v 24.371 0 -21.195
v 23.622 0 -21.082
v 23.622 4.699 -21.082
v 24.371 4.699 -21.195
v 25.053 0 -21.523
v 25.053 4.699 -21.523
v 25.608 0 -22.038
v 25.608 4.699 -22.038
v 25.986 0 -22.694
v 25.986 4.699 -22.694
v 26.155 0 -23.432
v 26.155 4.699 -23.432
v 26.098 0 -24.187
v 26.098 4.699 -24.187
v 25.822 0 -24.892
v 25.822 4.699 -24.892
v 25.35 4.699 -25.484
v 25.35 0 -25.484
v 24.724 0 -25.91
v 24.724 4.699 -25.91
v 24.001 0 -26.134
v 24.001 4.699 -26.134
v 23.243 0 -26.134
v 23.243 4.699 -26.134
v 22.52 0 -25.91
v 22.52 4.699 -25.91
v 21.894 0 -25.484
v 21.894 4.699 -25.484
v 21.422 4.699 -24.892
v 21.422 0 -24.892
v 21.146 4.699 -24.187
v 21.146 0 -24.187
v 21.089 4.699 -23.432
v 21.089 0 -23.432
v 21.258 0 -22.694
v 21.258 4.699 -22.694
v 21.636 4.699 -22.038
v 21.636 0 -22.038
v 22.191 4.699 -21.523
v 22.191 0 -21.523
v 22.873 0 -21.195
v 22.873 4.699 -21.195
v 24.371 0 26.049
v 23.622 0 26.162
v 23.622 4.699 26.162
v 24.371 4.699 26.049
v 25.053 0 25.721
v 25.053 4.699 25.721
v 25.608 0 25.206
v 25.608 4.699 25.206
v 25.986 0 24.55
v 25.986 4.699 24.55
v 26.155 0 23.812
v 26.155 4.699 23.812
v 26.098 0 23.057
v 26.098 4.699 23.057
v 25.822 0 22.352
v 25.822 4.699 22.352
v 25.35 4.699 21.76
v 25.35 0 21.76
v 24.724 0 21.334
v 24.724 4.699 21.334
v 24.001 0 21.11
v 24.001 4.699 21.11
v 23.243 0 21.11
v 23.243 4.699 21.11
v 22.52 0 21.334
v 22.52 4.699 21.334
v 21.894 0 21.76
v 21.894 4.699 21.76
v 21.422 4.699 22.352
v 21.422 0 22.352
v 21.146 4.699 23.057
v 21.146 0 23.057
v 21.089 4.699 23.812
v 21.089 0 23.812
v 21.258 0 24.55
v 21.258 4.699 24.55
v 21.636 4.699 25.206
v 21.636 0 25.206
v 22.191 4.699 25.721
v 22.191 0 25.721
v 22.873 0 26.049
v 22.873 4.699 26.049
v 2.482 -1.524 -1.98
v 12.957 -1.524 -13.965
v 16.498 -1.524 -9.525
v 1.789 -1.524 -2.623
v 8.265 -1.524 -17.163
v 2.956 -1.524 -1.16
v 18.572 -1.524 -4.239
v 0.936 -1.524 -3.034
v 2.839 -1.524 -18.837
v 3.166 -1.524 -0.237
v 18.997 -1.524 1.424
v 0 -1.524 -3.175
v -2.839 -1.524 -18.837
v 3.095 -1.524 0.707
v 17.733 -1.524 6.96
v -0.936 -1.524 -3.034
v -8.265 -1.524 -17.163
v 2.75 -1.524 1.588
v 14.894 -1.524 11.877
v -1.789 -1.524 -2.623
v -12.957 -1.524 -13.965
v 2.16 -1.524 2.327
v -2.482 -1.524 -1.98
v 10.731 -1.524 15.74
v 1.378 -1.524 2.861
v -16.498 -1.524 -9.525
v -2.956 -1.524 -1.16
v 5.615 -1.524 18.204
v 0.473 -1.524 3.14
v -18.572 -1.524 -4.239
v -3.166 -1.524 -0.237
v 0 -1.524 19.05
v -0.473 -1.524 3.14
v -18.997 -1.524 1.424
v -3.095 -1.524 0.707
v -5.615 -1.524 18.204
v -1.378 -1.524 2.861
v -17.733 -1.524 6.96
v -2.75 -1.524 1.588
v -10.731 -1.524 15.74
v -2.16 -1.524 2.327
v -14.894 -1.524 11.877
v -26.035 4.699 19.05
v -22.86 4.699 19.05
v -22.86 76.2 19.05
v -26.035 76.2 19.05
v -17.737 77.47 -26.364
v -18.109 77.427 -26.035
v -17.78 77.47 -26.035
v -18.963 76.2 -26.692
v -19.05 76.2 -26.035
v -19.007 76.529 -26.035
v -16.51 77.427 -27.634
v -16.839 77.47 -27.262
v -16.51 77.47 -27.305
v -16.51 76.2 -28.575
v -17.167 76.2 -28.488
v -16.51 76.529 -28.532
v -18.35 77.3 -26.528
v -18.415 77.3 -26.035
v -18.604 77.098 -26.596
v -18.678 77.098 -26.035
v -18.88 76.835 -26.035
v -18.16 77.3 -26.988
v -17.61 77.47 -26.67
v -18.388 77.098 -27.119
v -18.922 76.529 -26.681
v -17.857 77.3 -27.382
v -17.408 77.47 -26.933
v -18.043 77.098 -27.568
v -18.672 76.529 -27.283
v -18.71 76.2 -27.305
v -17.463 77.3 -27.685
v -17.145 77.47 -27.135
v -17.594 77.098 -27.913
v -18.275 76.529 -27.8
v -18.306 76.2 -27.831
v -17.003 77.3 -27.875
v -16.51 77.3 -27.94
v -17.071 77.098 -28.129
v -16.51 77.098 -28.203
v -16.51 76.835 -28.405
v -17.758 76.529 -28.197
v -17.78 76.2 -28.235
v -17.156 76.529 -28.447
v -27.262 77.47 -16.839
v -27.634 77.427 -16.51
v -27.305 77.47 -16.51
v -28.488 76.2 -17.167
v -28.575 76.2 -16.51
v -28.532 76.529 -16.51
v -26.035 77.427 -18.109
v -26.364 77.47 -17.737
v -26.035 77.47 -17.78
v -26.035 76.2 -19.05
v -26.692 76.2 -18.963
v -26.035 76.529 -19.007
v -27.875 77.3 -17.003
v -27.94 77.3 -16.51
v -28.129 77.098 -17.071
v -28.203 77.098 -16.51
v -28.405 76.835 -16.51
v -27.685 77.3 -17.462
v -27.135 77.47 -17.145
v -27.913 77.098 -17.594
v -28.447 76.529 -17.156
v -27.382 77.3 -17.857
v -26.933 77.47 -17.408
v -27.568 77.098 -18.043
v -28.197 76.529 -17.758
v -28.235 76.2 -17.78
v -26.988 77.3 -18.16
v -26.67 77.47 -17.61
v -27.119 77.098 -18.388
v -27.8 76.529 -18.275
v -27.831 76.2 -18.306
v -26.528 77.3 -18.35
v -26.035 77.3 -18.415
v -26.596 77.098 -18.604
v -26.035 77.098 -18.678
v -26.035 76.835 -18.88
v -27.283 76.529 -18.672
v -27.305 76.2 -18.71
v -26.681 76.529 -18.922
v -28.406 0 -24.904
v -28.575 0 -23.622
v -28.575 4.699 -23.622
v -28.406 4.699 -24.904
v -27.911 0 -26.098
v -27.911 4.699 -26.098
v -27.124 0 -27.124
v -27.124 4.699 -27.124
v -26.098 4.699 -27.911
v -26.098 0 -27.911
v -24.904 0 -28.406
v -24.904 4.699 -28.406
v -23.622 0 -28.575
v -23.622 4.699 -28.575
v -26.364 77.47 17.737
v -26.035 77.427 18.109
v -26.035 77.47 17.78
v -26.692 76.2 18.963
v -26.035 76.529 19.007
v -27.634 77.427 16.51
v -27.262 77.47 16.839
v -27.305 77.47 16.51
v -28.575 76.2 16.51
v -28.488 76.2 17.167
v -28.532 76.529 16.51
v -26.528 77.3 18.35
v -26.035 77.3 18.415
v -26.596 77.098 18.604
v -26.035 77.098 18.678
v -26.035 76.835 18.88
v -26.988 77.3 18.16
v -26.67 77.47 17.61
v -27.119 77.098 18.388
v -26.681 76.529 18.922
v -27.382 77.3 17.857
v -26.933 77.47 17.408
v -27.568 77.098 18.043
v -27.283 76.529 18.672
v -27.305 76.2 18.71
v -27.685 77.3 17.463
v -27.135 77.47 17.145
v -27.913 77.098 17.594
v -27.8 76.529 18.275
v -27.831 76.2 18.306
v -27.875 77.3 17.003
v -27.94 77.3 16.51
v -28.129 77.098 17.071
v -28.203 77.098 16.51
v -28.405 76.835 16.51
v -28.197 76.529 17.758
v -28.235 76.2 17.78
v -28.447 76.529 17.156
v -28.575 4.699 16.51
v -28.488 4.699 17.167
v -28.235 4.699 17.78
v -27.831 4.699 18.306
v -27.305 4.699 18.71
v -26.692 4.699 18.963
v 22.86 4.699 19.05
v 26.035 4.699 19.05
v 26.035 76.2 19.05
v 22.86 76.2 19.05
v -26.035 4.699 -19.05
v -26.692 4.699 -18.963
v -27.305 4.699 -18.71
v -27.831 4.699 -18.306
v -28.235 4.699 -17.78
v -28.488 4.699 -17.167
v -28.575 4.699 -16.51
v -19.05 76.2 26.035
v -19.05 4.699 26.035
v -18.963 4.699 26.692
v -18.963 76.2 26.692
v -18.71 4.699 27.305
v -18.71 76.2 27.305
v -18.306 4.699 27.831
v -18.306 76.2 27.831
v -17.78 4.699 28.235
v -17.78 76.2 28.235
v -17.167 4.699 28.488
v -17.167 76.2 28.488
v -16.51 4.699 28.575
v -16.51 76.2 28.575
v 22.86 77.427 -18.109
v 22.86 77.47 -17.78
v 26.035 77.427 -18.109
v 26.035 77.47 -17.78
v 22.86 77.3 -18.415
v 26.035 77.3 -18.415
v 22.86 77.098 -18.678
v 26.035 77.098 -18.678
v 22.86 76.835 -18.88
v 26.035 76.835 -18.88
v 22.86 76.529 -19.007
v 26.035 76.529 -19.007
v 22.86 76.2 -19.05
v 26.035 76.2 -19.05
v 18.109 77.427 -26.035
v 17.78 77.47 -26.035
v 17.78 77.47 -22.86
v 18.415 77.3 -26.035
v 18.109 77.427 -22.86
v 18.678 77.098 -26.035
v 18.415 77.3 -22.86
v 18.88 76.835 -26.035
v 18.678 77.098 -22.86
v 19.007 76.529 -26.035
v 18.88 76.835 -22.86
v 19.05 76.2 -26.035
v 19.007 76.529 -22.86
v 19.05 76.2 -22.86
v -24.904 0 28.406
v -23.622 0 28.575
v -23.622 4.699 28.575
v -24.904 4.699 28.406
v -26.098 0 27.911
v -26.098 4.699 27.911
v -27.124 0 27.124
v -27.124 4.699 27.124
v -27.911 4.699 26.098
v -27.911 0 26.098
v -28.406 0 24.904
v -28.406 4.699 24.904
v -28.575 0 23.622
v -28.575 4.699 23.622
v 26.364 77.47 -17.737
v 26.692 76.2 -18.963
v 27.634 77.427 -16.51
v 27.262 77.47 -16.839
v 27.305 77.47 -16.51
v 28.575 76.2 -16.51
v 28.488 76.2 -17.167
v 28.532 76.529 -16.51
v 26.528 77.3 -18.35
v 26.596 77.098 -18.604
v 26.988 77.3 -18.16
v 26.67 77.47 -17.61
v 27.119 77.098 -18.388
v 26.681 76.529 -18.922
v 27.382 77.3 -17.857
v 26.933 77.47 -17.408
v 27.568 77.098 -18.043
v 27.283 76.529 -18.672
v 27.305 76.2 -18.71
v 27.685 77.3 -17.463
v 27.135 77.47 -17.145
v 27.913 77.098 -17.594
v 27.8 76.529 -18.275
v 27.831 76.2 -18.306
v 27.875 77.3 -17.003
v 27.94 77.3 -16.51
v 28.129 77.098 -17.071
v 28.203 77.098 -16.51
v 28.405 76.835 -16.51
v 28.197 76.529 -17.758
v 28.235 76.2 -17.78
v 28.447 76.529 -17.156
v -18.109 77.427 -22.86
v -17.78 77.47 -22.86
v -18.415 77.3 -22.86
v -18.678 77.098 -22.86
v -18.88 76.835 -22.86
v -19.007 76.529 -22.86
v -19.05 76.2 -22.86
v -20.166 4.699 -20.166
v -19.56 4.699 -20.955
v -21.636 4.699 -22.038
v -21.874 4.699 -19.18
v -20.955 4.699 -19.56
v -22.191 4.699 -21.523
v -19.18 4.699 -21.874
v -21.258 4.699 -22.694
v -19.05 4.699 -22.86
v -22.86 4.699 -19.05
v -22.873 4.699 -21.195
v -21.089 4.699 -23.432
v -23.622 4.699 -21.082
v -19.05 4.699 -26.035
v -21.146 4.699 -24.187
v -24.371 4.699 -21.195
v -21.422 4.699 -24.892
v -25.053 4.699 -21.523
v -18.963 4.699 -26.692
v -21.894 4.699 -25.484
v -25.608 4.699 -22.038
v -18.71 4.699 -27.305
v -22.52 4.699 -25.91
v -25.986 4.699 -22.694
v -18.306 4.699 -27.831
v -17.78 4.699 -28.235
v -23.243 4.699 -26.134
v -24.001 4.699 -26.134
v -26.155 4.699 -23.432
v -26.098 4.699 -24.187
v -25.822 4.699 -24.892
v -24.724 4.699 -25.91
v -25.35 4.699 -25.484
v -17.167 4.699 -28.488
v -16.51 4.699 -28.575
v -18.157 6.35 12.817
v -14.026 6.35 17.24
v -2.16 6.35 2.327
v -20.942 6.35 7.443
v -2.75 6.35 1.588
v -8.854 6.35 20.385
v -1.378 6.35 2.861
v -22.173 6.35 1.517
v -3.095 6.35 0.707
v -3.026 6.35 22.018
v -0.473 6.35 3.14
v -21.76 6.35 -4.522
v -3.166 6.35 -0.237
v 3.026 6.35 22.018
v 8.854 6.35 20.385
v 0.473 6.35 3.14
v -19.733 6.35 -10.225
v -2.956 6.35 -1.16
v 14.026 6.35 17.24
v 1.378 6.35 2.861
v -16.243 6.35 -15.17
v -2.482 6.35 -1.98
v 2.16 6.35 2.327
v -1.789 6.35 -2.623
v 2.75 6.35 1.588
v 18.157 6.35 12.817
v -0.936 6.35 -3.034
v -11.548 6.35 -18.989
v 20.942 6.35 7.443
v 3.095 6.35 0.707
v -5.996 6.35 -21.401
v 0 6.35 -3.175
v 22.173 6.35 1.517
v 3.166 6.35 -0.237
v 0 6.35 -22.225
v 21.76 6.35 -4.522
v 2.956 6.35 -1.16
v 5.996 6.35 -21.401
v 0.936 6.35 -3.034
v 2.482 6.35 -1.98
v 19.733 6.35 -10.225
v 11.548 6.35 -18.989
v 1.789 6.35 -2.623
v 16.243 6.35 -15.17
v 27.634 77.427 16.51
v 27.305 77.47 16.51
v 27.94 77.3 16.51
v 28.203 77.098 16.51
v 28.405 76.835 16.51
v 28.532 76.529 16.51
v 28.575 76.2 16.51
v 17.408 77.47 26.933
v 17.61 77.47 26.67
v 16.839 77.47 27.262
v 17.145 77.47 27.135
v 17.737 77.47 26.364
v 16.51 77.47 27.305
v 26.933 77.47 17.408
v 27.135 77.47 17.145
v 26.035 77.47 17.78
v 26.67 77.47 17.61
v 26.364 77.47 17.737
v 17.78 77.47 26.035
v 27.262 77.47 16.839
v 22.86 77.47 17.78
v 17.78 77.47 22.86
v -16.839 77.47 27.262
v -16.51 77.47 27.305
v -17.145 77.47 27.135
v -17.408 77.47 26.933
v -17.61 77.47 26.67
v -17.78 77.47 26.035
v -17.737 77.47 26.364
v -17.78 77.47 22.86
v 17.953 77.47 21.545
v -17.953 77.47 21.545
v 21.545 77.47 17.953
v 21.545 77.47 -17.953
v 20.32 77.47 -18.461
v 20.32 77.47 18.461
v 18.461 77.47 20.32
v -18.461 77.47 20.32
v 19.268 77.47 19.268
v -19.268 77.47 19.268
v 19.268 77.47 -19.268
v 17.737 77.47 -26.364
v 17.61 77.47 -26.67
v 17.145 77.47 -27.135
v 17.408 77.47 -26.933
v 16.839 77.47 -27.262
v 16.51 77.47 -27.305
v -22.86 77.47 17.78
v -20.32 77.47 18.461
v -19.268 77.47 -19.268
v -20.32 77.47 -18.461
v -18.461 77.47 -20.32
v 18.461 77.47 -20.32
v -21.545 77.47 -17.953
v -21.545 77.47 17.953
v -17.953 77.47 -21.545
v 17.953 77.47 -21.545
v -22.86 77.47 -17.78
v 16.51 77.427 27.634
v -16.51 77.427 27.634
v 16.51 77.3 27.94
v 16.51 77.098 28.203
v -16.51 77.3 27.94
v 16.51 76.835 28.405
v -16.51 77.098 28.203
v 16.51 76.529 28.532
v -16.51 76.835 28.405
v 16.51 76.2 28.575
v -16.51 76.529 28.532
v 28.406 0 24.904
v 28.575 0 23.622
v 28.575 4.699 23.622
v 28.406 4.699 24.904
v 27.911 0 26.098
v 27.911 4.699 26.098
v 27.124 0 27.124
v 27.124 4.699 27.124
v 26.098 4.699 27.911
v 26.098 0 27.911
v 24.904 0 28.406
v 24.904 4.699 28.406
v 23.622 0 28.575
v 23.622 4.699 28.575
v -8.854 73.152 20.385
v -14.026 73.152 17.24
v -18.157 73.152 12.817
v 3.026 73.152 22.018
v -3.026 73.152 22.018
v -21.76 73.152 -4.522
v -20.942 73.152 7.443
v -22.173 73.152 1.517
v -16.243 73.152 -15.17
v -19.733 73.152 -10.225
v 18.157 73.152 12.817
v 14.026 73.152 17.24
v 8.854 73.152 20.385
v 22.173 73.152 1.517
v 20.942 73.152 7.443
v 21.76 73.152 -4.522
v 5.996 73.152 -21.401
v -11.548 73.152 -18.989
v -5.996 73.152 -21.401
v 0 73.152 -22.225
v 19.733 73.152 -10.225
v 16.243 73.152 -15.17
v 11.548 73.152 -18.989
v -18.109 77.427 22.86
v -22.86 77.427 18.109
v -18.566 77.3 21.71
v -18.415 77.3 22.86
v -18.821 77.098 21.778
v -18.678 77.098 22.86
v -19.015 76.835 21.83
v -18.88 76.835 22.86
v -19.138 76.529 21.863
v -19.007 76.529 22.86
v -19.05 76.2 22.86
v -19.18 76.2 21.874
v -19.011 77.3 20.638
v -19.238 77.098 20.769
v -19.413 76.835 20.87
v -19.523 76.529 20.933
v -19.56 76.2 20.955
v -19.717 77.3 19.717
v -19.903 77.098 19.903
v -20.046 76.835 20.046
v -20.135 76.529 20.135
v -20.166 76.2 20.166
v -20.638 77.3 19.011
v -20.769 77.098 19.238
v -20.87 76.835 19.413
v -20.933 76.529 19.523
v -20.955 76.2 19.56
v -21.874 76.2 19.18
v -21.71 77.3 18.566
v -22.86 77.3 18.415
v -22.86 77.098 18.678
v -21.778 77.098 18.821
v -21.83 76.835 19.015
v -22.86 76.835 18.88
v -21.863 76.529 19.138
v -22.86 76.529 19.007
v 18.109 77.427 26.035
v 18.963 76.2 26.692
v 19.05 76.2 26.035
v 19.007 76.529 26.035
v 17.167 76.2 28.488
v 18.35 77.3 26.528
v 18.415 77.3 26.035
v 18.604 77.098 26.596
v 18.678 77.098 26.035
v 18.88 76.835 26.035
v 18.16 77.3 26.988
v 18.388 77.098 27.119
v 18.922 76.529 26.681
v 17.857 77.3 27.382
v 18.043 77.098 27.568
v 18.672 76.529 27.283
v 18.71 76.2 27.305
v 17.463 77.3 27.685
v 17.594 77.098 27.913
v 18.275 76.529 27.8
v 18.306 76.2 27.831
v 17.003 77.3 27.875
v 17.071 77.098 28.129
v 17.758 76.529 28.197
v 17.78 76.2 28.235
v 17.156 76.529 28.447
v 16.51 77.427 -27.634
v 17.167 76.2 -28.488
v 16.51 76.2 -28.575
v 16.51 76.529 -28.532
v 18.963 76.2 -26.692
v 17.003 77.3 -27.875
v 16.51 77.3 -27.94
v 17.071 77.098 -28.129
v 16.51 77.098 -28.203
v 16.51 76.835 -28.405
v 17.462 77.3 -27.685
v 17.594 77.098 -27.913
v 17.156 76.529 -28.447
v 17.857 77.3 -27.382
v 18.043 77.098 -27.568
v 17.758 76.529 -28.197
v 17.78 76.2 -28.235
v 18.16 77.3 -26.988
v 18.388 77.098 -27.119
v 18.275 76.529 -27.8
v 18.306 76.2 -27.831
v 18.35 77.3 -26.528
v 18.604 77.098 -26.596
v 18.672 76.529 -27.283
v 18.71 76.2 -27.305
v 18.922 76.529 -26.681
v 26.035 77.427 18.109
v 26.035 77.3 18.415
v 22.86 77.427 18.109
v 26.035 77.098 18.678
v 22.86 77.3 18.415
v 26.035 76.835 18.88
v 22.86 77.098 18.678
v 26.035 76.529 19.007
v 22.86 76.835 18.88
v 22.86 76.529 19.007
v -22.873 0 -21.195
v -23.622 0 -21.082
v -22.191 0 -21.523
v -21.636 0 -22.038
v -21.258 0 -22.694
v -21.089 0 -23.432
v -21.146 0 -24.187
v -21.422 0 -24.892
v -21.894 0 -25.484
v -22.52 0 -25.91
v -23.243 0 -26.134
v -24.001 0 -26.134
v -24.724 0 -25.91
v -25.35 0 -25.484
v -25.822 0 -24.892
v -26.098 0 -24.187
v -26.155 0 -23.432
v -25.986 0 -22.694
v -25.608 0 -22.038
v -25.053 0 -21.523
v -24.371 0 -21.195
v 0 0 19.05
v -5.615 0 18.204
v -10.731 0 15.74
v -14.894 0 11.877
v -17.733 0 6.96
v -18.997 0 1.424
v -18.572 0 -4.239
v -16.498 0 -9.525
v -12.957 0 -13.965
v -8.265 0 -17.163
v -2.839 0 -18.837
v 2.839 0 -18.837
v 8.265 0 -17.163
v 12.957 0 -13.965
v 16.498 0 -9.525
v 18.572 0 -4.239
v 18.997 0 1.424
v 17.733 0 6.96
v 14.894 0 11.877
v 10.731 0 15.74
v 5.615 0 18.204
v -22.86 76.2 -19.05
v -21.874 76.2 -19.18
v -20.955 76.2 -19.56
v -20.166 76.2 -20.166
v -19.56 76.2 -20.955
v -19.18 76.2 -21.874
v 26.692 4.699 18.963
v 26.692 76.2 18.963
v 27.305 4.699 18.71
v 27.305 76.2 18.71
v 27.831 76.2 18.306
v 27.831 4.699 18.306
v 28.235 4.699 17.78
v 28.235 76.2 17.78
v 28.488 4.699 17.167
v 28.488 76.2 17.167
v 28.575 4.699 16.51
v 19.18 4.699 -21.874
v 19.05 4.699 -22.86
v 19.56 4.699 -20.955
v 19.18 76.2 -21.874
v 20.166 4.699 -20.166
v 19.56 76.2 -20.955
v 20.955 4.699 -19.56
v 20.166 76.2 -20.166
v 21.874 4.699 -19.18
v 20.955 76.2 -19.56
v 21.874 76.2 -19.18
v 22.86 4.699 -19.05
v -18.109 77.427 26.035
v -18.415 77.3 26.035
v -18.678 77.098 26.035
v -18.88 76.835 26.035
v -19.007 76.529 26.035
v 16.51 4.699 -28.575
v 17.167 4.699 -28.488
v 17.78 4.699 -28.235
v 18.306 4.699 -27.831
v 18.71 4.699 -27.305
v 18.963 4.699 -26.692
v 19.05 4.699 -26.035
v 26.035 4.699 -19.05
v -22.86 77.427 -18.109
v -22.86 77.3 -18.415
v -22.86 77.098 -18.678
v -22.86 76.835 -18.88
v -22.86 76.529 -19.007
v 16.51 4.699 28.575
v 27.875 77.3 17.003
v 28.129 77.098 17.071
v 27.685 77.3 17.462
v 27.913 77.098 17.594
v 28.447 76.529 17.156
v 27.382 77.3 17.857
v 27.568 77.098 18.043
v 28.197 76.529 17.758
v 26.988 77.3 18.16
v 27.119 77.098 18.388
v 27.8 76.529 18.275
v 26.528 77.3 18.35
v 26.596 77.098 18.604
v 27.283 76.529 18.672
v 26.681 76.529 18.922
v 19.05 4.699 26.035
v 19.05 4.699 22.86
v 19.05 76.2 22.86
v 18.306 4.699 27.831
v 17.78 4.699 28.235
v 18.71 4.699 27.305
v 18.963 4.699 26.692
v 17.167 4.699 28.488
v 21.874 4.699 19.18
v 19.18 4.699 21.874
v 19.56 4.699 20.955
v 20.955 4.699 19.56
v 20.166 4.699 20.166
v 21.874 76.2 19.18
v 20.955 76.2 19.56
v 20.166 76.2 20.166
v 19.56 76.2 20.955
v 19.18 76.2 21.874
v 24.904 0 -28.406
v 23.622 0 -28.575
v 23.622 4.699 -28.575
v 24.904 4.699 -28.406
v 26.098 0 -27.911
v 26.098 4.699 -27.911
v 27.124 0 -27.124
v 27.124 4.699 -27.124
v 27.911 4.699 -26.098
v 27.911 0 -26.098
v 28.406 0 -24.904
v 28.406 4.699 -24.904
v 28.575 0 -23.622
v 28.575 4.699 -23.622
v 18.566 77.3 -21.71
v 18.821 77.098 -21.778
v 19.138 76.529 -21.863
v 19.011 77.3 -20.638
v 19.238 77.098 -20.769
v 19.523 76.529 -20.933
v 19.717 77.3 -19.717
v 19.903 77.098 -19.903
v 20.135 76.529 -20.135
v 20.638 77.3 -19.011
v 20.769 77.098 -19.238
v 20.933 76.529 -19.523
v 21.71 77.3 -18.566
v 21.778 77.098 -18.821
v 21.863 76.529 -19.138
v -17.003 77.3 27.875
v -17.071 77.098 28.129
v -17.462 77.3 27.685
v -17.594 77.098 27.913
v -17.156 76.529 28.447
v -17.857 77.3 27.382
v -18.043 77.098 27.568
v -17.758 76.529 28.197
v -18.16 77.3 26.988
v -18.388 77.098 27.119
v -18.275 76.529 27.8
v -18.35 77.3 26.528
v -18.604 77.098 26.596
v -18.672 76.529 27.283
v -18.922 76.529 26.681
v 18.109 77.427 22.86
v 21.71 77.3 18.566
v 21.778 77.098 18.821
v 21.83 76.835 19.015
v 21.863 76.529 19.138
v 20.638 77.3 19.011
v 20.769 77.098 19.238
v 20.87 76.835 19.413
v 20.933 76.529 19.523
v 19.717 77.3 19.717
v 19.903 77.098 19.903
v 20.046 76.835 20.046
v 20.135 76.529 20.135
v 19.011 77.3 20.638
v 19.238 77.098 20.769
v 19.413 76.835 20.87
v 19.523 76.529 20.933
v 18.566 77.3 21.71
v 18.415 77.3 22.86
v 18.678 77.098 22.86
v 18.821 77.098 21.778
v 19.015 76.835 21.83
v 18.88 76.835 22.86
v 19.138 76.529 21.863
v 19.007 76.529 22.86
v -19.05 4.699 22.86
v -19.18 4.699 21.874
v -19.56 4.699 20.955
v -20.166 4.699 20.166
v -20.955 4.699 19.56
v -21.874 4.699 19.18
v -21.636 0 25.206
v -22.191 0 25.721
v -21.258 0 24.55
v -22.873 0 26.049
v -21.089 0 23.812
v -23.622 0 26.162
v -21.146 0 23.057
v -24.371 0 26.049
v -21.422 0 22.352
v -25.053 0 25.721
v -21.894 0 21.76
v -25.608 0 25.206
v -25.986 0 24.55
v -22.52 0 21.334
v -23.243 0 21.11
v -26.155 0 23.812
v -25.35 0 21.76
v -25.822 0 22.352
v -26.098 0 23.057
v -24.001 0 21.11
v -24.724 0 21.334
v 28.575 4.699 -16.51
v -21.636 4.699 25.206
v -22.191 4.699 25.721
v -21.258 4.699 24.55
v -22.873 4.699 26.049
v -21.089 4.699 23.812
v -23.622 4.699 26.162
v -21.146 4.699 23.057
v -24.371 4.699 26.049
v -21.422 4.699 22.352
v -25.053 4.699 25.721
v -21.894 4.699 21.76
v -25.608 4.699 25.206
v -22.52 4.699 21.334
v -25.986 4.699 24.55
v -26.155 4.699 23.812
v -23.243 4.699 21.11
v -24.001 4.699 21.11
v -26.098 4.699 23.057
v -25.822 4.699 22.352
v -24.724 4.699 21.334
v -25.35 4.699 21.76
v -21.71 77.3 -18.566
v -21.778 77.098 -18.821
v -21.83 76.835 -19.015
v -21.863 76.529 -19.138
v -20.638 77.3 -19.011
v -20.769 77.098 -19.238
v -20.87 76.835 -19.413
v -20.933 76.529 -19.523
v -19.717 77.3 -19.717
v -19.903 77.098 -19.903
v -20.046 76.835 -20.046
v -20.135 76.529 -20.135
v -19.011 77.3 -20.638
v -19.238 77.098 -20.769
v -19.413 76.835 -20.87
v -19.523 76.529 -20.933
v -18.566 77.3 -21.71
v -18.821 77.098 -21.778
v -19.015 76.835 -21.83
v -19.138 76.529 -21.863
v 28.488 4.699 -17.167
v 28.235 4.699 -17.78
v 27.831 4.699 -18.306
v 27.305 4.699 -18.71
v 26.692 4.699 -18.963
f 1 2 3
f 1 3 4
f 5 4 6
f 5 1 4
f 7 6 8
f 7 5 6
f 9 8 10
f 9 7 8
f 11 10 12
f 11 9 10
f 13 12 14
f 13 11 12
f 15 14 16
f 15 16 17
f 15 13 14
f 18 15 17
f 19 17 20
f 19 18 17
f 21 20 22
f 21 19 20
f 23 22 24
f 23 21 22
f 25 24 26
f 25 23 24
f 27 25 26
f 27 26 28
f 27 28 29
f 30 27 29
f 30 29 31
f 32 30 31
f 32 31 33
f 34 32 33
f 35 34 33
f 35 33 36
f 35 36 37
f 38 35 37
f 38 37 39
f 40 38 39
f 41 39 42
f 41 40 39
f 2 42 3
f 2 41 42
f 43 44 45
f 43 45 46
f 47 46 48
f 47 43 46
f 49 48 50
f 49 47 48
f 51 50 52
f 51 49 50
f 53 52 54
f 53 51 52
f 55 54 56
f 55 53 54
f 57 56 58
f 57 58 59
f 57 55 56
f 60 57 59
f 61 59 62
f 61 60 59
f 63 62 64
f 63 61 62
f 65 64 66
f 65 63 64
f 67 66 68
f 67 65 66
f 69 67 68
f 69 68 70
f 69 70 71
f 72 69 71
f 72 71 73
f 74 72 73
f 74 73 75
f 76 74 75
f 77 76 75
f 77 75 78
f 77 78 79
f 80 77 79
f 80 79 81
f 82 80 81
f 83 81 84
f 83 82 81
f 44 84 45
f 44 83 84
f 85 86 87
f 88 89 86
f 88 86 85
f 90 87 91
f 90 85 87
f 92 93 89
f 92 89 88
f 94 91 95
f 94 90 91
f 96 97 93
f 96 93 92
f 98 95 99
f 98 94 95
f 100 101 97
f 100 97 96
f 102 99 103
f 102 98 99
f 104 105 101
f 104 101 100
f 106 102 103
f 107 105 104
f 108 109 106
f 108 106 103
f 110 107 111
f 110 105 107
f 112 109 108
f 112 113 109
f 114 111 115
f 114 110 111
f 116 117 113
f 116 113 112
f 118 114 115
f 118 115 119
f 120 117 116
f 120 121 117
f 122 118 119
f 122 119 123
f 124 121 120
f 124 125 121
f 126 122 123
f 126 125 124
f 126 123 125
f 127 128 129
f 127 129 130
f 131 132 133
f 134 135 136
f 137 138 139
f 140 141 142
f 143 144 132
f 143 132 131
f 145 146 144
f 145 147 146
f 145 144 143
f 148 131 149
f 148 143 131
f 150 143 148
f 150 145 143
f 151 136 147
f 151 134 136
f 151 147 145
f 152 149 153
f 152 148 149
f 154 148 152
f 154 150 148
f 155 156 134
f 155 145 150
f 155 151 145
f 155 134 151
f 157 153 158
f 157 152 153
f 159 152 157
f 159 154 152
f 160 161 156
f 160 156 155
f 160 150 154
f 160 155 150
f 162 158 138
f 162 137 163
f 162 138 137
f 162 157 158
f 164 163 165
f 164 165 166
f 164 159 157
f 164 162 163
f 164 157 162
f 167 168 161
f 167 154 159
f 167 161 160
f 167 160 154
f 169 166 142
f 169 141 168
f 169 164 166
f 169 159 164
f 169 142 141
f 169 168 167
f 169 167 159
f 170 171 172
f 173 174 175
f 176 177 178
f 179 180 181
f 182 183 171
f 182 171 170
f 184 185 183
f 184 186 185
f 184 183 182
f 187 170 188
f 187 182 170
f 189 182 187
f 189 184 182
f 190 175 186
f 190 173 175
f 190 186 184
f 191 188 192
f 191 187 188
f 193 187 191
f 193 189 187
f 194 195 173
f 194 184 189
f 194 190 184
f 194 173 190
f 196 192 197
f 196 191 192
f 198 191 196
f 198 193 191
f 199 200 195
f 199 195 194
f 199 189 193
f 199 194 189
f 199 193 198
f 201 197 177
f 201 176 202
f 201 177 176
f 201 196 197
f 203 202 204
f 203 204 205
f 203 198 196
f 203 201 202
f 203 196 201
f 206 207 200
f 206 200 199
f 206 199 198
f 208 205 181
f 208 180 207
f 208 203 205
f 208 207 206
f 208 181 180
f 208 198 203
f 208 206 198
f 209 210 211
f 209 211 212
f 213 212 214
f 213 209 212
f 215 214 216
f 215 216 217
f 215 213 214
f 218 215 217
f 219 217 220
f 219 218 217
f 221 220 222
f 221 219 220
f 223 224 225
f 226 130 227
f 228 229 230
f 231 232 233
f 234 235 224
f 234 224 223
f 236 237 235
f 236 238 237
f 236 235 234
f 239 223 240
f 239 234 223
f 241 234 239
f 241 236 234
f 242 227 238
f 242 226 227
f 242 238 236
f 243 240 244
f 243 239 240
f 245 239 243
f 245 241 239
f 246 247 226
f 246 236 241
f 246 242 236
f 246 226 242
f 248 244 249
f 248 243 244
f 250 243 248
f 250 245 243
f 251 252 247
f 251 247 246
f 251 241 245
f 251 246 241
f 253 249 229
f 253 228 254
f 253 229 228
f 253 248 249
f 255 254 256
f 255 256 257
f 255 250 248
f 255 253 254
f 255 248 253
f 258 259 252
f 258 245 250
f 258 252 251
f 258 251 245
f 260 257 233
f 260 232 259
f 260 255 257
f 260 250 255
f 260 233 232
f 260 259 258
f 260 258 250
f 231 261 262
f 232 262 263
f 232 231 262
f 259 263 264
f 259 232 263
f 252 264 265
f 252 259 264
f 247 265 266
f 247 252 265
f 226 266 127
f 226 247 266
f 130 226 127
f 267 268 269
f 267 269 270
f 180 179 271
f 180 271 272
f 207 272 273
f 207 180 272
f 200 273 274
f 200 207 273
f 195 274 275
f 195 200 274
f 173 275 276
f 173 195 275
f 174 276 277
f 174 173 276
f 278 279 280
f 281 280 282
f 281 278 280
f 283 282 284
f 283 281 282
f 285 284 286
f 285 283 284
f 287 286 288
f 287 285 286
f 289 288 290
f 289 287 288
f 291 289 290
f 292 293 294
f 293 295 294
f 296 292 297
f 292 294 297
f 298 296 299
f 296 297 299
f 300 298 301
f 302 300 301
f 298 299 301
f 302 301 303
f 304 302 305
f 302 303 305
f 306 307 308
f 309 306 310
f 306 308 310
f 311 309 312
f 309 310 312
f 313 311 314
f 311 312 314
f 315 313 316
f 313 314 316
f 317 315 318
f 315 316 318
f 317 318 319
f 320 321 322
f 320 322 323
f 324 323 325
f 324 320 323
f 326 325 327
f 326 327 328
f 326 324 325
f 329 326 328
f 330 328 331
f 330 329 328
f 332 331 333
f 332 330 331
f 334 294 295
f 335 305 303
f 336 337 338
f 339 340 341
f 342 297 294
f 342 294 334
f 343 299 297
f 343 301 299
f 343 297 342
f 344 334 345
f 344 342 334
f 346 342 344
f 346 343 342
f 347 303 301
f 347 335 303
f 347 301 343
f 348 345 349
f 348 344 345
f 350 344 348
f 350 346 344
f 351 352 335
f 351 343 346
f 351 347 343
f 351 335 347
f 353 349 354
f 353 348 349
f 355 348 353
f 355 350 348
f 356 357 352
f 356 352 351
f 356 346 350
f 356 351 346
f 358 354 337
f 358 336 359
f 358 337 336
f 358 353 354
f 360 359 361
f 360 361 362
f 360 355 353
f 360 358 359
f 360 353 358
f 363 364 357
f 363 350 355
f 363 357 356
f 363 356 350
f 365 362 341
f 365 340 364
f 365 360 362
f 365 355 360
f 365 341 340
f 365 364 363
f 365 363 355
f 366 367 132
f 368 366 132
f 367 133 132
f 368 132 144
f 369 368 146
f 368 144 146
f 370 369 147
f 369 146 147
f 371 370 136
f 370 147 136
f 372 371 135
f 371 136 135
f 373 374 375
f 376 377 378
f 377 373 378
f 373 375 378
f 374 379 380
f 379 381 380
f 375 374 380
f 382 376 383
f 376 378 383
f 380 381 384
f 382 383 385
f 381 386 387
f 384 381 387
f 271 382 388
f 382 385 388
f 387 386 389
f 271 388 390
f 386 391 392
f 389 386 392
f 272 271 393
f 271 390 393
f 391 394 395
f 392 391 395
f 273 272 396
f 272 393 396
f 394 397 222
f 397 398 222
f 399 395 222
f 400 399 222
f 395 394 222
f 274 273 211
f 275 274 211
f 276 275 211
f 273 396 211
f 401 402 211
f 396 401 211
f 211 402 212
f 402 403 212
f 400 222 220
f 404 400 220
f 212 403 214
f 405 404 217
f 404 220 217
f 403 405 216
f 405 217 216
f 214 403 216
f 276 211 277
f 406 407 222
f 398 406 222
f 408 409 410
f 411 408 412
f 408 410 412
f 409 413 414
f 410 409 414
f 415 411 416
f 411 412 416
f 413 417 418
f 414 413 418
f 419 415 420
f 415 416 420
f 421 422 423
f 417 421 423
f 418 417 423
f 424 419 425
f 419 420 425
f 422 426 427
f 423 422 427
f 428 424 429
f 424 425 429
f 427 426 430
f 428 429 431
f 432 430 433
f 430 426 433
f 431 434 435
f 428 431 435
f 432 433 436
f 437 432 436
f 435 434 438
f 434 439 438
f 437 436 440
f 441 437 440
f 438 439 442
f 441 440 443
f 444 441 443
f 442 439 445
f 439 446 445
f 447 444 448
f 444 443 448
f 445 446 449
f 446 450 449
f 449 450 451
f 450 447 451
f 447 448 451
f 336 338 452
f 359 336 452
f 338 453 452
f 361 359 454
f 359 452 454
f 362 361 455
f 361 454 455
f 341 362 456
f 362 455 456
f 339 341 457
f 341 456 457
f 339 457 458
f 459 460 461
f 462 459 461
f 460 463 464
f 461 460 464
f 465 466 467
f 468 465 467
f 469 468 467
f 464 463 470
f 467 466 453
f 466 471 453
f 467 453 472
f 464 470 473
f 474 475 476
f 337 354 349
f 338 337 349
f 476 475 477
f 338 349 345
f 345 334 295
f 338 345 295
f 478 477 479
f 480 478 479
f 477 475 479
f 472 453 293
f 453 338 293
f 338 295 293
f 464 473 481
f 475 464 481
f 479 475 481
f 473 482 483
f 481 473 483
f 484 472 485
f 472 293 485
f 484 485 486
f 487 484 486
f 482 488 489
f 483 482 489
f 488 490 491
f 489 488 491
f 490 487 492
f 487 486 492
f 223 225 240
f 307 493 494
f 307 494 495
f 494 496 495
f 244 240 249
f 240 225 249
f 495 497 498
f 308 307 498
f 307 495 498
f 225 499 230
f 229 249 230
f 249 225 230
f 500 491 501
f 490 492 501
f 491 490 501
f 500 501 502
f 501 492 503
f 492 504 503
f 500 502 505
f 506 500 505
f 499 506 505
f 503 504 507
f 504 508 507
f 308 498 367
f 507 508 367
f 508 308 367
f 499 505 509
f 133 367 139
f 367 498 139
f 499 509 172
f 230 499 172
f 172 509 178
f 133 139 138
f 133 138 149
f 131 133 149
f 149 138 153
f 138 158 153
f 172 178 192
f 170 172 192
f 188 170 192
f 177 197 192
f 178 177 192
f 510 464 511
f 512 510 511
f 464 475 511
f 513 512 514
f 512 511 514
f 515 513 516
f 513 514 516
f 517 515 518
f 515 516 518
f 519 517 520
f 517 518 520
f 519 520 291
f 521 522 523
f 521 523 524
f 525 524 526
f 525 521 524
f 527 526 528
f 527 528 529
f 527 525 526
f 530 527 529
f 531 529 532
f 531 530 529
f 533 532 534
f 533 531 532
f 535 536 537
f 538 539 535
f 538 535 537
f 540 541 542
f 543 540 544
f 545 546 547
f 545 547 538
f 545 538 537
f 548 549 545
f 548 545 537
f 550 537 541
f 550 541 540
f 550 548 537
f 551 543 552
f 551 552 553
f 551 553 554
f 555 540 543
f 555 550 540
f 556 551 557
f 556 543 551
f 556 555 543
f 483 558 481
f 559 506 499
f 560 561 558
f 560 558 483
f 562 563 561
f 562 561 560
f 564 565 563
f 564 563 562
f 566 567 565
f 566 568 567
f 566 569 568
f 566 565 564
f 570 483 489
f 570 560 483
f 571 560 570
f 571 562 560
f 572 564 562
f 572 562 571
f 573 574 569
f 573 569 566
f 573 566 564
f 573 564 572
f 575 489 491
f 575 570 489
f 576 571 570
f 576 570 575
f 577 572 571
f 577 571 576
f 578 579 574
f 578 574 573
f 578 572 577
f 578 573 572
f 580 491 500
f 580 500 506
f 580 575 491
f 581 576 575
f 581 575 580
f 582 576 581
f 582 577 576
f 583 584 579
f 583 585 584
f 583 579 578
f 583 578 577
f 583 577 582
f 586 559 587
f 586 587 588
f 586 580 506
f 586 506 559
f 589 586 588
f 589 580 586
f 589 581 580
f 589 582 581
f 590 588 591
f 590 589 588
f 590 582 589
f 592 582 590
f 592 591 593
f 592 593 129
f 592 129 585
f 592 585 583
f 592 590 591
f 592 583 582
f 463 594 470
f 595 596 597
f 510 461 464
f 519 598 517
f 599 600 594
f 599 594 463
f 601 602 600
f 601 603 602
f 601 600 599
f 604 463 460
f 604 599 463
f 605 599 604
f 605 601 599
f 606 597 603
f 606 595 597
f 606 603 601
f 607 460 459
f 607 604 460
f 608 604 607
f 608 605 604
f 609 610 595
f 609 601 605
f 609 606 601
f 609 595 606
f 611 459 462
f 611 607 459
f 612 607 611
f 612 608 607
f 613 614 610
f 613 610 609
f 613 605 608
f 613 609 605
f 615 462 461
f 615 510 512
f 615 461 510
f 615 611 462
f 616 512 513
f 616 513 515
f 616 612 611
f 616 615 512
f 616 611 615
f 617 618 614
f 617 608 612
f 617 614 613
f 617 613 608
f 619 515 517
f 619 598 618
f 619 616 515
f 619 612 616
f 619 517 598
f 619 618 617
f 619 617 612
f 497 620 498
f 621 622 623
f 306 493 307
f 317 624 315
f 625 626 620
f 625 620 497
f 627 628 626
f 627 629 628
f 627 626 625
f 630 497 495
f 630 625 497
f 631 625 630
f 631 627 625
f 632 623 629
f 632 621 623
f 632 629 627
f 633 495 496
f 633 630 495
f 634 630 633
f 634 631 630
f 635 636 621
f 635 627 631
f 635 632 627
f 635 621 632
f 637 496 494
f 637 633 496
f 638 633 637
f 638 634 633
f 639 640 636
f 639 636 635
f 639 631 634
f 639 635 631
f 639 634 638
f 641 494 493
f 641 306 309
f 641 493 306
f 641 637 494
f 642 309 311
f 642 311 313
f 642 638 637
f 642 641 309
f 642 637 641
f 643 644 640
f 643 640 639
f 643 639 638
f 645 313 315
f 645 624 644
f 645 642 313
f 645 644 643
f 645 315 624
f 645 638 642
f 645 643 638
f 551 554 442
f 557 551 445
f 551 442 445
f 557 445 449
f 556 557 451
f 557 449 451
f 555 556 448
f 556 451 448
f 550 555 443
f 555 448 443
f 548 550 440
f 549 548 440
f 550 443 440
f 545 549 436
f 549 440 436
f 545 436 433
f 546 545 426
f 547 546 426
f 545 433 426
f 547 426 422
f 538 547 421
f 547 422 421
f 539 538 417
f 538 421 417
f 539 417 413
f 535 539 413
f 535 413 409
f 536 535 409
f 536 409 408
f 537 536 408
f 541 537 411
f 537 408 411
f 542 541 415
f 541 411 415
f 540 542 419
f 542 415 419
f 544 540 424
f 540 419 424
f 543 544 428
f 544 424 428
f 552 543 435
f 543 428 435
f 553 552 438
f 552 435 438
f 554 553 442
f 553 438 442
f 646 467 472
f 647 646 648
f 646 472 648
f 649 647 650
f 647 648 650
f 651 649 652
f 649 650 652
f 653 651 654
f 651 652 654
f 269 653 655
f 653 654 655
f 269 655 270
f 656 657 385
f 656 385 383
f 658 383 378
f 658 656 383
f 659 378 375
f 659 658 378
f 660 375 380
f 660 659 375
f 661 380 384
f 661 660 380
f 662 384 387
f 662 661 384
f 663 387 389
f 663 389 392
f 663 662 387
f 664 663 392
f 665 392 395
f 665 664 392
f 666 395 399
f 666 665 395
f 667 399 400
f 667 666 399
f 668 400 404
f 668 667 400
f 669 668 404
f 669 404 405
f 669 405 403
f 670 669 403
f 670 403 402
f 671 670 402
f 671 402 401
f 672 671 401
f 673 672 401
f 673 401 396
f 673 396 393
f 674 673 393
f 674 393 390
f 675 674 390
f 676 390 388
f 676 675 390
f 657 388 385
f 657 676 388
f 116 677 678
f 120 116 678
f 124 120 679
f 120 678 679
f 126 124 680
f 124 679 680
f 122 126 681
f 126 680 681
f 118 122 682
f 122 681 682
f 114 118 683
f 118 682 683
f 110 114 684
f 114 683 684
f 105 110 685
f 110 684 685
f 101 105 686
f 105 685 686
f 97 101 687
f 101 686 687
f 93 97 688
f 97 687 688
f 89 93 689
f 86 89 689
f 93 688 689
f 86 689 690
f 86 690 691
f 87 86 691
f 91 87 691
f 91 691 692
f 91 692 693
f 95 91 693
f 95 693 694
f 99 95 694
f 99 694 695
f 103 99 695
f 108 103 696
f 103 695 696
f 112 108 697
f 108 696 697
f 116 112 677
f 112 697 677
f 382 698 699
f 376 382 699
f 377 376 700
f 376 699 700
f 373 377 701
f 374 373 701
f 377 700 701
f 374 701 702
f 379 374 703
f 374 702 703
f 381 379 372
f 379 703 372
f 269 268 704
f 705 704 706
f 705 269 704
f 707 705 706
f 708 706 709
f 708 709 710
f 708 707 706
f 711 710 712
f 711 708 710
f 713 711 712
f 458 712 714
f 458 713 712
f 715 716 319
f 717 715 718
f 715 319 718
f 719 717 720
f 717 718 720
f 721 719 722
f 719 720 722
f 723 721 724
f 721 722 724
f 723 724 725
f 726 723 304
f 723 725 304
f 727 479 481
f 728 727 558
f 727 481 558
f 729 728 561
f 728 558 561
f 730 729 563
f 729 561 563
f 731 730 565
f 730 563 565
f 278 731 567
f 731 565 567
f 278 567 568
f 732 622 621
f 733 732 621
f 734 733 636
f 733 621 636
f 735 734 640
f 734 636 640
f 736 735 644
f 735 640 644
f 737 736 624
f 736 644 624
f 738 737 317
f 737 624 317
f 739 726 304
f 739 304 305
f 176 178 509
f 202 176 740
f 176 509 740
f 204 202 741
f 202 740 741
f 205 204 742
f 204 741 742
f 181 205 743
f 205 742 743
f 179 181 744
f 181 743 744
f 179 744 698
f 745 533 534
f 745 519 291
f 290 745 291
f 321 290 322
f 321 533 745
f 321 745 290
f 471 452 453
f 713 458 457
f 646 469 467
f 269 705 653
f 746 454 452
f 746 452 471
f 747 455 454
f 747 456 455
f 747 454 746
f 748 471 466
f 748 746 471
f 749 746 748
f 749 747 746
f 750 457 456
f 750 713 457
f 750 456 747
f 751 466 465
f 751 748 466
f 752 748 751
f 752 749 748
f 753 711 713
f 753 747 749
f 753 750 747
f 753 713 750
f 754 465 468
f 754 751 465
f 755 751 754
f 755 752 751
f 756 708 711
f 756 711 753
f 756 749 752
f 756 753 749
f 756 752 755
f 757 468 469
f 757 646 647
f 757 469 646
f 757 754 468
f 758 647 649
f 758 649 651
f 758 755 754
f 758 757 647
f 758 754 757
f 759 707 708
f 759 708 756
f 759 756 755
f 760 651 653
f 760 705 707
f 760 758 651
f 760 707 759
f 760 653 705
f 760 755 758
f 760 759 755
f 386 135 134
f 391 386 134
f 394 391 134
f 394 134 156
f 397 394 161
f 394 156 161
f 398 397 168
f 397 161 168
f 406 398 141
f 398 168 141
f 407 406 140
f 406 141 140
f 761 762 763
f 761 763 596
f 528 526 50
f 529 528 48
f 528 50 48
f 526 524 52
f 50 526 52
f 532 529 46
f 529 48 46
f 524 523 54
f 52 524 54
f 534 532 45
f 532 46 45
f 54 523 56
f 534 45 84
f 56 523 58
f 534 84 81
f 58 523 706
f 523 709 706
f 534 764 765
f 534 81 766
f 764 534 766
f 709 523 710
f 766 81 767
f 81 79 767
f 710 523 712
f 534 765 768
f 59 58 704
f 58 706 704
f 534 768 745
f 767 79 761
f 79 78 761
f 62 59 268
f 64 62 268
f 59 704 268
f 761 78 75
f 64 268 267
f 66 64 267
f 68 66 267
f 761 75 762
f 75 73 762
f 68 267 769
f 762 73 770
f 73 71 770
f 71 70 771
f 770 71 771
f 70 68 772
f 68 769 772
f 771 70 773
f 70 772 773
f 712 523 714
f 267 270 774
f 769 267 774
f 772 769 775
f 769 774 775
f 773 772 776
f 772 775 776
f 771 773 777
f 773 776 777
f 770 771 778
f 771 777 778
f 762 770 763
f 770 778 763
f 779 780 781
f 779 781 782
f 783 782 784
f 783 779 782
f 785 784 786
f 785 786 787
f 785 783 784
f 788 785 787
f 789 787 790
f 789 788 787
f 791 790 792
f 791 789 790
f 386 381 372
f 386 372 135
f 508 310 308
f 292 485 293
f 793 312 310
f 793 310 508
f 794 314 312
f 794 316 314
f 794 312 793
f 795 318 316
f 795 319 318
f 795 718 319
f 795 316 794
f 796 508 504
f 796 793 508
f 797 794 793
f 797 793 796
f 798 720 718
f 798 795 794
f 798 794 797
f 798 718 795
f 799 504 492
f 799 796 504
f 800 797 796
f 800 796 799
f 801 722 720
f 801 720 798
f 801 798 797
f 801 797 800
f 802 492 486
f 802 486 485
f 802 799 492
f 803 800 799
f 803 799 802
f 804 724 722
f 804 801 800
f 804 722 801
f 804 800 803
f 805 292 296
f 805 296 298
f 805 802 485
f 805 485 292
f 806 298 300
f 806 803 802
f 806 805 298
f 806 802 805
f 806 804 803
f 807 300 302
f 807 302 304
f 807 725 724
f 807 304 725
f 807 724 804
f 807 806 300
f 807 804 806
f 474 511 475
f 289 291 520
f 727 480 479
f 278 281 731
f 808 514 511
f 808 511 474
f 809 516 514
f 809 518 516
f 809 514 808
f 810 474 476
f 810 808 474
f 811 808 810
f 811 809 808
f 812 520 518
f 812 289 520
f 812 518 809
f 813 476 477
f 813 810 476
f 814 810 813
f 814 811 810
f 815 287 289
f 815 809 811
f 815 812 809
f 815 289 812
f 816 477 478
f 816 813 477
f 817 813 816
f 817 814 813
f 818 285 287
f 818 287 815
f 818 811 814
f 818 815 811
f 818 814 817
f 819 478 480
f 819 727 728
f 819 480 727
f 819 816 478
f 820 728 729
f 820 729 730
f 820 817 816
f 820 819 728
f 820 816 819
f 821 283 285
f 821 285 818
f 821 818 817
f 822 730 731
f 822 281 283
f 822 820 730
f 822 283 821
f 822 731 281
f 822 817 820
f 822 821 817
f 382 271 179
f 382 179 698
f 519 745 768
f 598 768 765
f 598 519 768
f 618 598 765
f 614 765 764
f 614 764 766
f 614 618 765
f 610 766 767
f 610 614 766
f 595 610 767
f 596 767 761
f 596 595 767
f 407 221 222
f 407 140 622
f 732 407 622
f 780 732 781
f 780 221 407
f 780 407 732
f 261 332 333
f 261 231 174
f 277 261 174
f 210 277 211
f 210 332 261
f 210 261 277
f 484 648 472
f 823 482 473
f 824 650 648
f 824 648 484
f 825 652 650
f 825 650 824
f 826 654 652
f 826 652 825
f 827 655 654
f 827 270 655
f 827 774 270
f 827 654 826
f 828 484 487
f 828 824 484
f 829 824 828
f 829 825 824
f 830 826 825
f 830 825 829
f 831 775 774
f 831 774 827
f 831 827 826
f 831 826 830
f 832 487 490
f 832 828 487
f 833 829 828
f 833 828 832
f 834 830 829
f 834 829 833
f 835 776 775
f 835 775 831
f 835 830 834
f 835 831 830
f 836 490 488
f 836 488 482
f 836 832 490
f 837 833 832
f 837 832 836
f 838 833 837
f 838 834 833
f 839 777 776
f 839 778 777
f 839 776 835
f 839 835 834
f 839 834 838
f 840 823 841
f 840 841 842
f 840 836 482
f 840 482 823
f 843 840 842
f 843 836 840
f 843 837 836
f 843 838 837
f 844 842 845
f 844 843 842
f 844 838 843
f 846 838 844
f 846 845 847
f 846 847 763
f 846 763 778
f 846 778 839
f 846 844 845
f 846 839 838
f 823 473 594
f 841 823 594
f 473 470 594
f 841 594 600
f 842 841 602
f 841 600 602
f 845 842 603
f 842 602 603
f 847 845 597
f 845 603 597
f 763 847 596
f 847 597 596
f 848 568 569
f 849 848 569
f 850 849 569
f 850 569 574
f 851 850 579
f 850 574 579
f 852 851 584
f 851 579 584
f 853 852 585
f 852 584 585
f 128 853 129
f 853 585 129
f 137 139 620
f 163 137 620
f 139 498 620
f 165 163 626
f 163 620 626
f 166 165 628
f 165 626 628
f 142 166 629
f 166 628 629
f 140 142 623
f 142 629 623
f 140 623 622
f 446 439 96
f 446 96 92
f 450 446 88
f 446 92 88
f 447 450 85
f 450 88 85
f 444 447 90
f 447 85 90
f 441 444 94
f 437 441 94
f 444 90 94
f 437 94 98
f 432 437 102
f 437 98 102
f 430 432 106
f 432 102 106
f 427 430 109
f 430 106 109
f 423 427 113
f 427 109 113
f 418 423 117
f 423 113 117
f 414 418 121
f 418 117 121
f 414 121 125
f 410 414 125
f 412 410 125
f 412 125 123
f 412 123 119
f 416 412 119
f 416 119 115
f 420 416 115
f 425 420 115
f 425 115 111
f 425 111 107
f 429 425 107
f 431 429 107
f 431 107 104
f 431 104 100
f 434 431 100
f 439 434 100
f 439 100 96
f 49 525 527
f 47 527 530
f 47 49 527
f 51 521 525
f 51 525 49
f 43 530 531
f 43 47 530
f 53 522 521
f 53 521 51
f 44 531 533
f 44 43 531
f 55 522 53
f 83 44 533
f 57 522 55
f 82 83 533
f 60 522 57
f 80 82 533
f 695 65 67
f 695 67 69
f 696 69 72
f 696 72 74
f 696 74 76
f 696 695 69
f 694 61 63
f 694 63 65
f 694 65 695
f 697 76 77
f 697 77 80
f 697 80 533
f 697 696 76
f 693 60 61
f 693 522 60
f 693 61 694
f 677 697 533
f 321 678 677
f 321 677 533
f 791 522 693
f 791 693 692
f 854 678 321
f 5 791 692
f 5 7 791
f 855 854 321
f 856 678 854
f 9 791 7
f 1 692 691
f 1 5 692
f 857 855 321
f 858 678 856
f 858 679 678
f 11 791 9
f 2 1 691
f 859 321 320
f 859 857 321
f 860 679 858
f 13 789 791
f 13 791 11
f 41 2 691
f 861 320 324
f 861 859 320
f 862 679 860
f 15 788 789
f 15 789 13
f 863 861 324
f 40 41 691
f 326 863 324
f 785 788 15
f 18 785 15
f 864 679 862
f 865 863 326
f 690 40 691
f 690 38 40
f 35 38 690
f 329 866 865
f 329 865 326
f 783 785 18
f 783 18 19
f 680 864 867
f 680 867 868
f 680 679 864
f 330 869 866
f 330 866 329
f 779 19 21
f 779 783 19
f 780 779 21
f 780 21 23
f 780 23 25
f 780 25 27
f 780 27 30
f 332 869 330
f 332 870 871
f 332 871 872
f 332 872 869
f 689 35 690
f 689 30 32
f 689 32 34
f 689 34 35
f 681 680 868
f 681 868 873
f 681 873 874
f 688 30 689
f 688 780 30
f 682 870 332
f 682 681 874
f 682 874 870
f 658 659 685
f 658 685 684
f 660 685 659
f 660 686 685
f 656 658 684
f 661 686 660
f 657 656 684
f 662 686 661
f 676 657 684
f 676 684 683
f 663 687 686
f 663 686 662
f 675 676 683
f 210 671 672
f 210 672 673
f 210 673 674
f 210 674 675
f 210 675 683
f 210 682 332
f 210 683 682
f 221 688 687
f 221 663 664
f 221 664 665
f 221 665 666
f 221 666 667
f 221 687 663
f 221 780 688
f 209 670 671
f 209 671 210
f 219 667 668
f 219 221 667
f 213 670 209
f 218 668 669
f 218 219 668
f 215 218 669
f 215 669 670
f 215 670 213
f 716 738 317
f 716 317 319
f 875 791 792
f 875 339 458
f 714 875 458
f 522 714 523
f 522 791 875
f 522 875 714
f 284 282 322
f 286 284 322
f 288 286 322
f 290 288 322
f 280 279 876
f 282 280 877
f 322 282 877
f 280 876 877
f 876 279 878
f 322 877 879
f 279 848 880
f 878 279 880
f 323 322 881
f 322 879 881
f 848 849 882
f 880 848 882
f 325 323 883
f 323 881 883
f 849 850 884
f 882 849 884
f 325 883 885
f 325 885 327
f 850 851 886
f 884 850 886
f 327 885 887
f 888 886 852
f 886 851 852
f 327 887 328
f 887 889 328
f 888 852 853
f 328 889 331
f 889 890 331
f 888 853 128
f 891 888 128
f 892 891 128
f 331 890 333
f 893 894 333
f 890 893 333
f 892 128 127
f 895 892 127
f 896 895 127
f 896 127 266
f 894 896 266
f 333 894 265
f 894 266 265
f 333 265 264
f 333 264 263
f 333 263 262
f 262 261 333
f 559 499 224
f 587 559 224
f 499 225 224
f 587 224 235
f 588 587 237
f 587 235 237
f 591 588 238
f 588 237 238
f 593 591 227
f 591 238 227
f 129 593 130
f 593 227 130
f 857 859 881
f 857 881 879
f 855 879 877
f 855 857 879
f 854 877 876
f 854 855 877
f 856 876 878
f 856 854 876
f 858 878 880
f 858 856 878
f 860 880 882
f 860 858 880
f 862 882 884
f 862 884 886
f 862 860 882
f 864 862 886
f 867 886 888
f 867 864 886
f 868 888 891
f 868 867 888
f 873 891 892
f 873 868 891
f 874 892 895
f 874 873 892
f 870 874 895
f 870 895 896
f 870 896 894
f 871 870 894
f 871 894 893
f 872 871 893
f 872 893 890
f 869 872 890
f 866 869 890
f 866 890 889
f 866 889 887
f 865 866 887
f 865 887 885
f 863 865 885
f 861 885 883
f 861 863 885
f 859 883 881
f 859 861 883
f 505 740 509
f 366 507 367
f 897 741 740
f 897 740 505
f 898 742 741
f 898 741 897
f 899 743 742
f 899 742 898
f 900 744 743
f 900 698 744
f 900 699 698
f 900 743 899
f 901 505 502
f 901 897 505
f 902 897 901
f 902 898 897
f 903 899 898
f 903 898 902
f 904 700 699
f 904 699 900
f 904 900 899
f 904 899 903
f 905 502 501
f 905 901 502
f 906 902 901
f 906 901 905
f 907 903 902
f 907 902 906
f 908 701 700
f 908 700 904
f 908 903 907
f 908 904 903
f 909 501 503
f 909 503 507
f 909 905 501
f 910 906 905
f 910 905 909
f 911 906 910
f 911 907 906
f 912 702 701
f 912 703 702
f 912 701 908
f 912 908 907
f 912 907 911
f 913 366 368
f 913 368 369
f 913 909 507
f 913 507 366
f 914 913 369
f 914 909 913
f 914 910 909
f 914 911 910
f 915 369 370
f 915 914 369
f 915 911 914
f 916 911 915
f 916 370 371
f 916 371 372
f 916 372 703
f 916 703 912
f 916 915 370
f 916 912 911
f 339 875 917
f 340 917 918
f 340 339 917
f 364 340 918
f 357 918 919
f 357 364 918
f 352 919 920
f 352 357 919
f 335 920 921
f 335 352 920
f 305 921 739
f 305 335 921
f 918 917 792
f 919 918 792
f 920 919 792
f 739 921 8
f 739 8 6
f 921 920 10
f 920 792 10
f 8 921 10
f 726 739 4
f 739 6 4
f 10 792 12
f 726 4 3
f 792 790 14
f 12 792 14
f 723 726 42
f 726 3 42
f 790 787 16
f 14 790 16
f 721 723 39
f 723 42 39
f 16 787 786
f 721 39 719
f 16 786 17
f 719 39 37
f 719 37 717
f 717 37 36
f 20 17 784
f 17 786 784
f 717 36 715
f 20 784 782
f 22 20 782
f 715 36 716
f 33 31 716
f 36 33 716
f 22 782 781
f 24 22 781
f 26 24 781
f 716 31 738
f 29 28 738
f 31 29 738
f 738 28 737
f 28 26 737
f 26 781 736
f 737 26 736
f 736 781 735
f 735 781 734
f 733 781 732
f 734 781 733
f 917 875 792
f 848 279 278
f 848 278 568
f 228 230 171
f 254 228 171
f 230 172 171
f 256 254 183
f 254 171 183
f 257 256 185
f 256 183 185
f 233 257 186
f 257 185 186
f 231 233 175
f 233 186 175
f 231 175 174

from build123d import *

# Parameters (mm, degrees)
SKETCH1_R           = 2.54
BOSS_EXTRUDE1_DEPTH = 4.699
BOSS_EXTRUDE2_DEPTH = 72.771
FILLET1_R           = 3.81
FILLET2_R           = 2.54
FILLET3_R           = 1.27
SKETCH3_R           = 19.05
BOSS_EXTRUDE3_DEPTH = 1.524
CUT_EXTRUDE1_START  = -6.35
SKETCH5_R           = 22.225
CUT_EXTRUDE1_DEPTH  = 66.802
SKETCH4_R           = 3.175
CUT_EXTRUDE4_DEPTH  = 12.7


with BuildPart() as part:
    # Sketch1 → Boss-Extrude1 (new body)
    with BuildSketch(Plane(origin=(0, 0, 0), x_dir=(1, 0, 0), z_dir=(0, 1, 0))):
        with BuildLine():
            Line((-23.622, 28.575), (23.622, 28.575))
            ThreePointArc((23.622, 28.575), (27.124299887, 27.124299887), (28.575, 23.622))
            Line((28.575, 23.622), (28.575, -23.622))
            ThreePointArc((28.575, -23.622), (27.124299887, -27.124299887), (23.622, -28.575))
            Line((23.622, -28.575), (-23.622, -28.575))
            ThreePointArc((-23.622, -28.575), (-27.124299887, -27.124299887), (-28.575, -23.622))
            Line((-28.575, -23.622), (-28.575, 23.622))
            ThreePointArc((-28.575, 23.622), (-27.124299887, 27.124299887), (-23.622, 28.575))
        make_face()
        with Locations(Location((-23.622, 23.622, 0), (0, 0, 270))):
            Circle(SKETCH1_R, mode=Mode.SUBTRACT)
        with Locations(Location((23.622, 23.622, 0), (0, 0, 270))):
            Circle(SKETCH1_R, mode=Mode.SUBTRACT)
        with Locations(Location((23.622, -23.622, 0), (0, 0, 270))):
            Circle(SKETCH1_R, mode=Mode.SUBTRACT)
        with Locations(Location((-23.622, -23.622, 0), (0, 0, 270))):
            Circle(SKETCH1_R, mode=Mode.SUBTRACT)
    extrude(amount=BOSS_EXTRUDE1_DEPTH)

    # Sketch2 → Boss-Extrude2 (add)
    with BuildSketch(Plane(origin=(0, 4.699, 0), x_dir=(1, 0, 0), z_dir=(0, 1, 0))):
        Polygon((-19.05, -28.575), (-19.05, -19.05), (-28.575, -19.05), (-28.575, 19.05), (-19.05, 19.05), (-19.05, 28.575), (19.05, 28.575), (19.05, 19.05), (28.575, 19.05), (28.575, -19.05), (19.05, -19.05), (19.05, -28.575), align=None)
    extrude(amount=BOSS_EXTRUDE2_DEPTH)

    # Fillet1
    fillet1_edges = [part.edges().sort_by_distance(p)[0] for p in [
        (-19.05, 41.0845, 19.05),
        (-19.05, 41.0845, -19.05),
        (19.05, 41.0845, -19.05),
        (19.05, 41.0845, 19.05),
    ]]
    fillet(fillet1_edges, radius=FILLET1_R)

    # Fillet2
    fillet2_edges = [part.edges().sort_by_distance(p)[0] for p in [
        (28.575, 41.0845, -19.05),
        (19.05, 41.0845, -28.575),
        (28.575, 41.0845, 19.05),
        (-19.05, 41.0845, -28.575),
        (-28.575, 41.0845, -19.05),
        (-19.05, 41.0845, 28.575),
        (-28.575, 41.0845, 19.05),
        (19.05, 41.0845, 28.575),
    ]]
    fillet(fillet2_edges, radius=FILLET2_R)

    # Fillet3
    fillet3_edges = [part.edges().sort_by_distance(p)[0] for p in [
        (24.4475, 77.47, -19.05),
        (28.575, 77.47, 0),
        (0, 77.47, 28.575),
        (19.05, 77.47, 24.4475),
        (0, 77.47, -28.575),
        (-19.05, 77.47, -24.4475),
        (-28.575, 77.47, 0),
        (-24.4475, 77.47, 19.05),
        (18.306051224, 77.47, 27.831051224),
        (-27.831051224, 77.47, 18.306051224),
        (-18.306051224, 77.47, 27.831051224),
        (-27.831051224, 77.47, -18.306051224),
        (-18.306051224, 77.47, -27.831051224),
        (27.831051224, 77.47, 18.306051224),
        (18.306051224, 77.47, -27.831051224),
        (27.831051224, 77.47, -18.306051224),
        (-19.05, 77.47, 24.4475),
        (-24.4475, 77.47, -19.05),
        (19.05, 77.47, -24.4475),
        (24.4475, 77.47, 19.05),
        (-20.165923164, 77.47, 20.165923164),
        (-20.165923164, 77.47, -20.165923164),
        (20.165923164, 77.47, -20.165923164),
        (20.165923164, 77.47, 20.165923164),
    ]]
    fillet(fillet3_edges, radius=FILLET3_R)

    # Sketch3 → Boss-Extrude3 (add)
    with BuildSketch(Plane.XZ):
        with Locations(Location((0, 0, 0), (0, 0, 90))):
            Circle(SKETCH3_R)
    extrude(amount=BOSS_EXTRUDE3_DEPTH)

    # Sketch5 → Cut-Extrude1 (cut)
    with BuildSketch(Plane.XZ.offset(CUT_EXTRUDE1_START)):
        with Locations(Location((0, 0, 0), (0, 0, 270))):
            Circle(SKETCH5_R)
    extrude(amount=-CUT_EXTRUDE1_DEPTH, mode=Mode.SUBTRACT)

    # Sketch4 → Cut-Extrude4 (cut)
    with BuildSketch(Plane.XZ.offset(1.524)):
        with Locations(Location((0, 0, 0), (0, 0, 270))):
            Circle(SKETCH4_R)
    extrude(amount=-CUT_EXTRUDE4_DEPTH, mode=Mode.SUBTRACT)


solid = part.part
